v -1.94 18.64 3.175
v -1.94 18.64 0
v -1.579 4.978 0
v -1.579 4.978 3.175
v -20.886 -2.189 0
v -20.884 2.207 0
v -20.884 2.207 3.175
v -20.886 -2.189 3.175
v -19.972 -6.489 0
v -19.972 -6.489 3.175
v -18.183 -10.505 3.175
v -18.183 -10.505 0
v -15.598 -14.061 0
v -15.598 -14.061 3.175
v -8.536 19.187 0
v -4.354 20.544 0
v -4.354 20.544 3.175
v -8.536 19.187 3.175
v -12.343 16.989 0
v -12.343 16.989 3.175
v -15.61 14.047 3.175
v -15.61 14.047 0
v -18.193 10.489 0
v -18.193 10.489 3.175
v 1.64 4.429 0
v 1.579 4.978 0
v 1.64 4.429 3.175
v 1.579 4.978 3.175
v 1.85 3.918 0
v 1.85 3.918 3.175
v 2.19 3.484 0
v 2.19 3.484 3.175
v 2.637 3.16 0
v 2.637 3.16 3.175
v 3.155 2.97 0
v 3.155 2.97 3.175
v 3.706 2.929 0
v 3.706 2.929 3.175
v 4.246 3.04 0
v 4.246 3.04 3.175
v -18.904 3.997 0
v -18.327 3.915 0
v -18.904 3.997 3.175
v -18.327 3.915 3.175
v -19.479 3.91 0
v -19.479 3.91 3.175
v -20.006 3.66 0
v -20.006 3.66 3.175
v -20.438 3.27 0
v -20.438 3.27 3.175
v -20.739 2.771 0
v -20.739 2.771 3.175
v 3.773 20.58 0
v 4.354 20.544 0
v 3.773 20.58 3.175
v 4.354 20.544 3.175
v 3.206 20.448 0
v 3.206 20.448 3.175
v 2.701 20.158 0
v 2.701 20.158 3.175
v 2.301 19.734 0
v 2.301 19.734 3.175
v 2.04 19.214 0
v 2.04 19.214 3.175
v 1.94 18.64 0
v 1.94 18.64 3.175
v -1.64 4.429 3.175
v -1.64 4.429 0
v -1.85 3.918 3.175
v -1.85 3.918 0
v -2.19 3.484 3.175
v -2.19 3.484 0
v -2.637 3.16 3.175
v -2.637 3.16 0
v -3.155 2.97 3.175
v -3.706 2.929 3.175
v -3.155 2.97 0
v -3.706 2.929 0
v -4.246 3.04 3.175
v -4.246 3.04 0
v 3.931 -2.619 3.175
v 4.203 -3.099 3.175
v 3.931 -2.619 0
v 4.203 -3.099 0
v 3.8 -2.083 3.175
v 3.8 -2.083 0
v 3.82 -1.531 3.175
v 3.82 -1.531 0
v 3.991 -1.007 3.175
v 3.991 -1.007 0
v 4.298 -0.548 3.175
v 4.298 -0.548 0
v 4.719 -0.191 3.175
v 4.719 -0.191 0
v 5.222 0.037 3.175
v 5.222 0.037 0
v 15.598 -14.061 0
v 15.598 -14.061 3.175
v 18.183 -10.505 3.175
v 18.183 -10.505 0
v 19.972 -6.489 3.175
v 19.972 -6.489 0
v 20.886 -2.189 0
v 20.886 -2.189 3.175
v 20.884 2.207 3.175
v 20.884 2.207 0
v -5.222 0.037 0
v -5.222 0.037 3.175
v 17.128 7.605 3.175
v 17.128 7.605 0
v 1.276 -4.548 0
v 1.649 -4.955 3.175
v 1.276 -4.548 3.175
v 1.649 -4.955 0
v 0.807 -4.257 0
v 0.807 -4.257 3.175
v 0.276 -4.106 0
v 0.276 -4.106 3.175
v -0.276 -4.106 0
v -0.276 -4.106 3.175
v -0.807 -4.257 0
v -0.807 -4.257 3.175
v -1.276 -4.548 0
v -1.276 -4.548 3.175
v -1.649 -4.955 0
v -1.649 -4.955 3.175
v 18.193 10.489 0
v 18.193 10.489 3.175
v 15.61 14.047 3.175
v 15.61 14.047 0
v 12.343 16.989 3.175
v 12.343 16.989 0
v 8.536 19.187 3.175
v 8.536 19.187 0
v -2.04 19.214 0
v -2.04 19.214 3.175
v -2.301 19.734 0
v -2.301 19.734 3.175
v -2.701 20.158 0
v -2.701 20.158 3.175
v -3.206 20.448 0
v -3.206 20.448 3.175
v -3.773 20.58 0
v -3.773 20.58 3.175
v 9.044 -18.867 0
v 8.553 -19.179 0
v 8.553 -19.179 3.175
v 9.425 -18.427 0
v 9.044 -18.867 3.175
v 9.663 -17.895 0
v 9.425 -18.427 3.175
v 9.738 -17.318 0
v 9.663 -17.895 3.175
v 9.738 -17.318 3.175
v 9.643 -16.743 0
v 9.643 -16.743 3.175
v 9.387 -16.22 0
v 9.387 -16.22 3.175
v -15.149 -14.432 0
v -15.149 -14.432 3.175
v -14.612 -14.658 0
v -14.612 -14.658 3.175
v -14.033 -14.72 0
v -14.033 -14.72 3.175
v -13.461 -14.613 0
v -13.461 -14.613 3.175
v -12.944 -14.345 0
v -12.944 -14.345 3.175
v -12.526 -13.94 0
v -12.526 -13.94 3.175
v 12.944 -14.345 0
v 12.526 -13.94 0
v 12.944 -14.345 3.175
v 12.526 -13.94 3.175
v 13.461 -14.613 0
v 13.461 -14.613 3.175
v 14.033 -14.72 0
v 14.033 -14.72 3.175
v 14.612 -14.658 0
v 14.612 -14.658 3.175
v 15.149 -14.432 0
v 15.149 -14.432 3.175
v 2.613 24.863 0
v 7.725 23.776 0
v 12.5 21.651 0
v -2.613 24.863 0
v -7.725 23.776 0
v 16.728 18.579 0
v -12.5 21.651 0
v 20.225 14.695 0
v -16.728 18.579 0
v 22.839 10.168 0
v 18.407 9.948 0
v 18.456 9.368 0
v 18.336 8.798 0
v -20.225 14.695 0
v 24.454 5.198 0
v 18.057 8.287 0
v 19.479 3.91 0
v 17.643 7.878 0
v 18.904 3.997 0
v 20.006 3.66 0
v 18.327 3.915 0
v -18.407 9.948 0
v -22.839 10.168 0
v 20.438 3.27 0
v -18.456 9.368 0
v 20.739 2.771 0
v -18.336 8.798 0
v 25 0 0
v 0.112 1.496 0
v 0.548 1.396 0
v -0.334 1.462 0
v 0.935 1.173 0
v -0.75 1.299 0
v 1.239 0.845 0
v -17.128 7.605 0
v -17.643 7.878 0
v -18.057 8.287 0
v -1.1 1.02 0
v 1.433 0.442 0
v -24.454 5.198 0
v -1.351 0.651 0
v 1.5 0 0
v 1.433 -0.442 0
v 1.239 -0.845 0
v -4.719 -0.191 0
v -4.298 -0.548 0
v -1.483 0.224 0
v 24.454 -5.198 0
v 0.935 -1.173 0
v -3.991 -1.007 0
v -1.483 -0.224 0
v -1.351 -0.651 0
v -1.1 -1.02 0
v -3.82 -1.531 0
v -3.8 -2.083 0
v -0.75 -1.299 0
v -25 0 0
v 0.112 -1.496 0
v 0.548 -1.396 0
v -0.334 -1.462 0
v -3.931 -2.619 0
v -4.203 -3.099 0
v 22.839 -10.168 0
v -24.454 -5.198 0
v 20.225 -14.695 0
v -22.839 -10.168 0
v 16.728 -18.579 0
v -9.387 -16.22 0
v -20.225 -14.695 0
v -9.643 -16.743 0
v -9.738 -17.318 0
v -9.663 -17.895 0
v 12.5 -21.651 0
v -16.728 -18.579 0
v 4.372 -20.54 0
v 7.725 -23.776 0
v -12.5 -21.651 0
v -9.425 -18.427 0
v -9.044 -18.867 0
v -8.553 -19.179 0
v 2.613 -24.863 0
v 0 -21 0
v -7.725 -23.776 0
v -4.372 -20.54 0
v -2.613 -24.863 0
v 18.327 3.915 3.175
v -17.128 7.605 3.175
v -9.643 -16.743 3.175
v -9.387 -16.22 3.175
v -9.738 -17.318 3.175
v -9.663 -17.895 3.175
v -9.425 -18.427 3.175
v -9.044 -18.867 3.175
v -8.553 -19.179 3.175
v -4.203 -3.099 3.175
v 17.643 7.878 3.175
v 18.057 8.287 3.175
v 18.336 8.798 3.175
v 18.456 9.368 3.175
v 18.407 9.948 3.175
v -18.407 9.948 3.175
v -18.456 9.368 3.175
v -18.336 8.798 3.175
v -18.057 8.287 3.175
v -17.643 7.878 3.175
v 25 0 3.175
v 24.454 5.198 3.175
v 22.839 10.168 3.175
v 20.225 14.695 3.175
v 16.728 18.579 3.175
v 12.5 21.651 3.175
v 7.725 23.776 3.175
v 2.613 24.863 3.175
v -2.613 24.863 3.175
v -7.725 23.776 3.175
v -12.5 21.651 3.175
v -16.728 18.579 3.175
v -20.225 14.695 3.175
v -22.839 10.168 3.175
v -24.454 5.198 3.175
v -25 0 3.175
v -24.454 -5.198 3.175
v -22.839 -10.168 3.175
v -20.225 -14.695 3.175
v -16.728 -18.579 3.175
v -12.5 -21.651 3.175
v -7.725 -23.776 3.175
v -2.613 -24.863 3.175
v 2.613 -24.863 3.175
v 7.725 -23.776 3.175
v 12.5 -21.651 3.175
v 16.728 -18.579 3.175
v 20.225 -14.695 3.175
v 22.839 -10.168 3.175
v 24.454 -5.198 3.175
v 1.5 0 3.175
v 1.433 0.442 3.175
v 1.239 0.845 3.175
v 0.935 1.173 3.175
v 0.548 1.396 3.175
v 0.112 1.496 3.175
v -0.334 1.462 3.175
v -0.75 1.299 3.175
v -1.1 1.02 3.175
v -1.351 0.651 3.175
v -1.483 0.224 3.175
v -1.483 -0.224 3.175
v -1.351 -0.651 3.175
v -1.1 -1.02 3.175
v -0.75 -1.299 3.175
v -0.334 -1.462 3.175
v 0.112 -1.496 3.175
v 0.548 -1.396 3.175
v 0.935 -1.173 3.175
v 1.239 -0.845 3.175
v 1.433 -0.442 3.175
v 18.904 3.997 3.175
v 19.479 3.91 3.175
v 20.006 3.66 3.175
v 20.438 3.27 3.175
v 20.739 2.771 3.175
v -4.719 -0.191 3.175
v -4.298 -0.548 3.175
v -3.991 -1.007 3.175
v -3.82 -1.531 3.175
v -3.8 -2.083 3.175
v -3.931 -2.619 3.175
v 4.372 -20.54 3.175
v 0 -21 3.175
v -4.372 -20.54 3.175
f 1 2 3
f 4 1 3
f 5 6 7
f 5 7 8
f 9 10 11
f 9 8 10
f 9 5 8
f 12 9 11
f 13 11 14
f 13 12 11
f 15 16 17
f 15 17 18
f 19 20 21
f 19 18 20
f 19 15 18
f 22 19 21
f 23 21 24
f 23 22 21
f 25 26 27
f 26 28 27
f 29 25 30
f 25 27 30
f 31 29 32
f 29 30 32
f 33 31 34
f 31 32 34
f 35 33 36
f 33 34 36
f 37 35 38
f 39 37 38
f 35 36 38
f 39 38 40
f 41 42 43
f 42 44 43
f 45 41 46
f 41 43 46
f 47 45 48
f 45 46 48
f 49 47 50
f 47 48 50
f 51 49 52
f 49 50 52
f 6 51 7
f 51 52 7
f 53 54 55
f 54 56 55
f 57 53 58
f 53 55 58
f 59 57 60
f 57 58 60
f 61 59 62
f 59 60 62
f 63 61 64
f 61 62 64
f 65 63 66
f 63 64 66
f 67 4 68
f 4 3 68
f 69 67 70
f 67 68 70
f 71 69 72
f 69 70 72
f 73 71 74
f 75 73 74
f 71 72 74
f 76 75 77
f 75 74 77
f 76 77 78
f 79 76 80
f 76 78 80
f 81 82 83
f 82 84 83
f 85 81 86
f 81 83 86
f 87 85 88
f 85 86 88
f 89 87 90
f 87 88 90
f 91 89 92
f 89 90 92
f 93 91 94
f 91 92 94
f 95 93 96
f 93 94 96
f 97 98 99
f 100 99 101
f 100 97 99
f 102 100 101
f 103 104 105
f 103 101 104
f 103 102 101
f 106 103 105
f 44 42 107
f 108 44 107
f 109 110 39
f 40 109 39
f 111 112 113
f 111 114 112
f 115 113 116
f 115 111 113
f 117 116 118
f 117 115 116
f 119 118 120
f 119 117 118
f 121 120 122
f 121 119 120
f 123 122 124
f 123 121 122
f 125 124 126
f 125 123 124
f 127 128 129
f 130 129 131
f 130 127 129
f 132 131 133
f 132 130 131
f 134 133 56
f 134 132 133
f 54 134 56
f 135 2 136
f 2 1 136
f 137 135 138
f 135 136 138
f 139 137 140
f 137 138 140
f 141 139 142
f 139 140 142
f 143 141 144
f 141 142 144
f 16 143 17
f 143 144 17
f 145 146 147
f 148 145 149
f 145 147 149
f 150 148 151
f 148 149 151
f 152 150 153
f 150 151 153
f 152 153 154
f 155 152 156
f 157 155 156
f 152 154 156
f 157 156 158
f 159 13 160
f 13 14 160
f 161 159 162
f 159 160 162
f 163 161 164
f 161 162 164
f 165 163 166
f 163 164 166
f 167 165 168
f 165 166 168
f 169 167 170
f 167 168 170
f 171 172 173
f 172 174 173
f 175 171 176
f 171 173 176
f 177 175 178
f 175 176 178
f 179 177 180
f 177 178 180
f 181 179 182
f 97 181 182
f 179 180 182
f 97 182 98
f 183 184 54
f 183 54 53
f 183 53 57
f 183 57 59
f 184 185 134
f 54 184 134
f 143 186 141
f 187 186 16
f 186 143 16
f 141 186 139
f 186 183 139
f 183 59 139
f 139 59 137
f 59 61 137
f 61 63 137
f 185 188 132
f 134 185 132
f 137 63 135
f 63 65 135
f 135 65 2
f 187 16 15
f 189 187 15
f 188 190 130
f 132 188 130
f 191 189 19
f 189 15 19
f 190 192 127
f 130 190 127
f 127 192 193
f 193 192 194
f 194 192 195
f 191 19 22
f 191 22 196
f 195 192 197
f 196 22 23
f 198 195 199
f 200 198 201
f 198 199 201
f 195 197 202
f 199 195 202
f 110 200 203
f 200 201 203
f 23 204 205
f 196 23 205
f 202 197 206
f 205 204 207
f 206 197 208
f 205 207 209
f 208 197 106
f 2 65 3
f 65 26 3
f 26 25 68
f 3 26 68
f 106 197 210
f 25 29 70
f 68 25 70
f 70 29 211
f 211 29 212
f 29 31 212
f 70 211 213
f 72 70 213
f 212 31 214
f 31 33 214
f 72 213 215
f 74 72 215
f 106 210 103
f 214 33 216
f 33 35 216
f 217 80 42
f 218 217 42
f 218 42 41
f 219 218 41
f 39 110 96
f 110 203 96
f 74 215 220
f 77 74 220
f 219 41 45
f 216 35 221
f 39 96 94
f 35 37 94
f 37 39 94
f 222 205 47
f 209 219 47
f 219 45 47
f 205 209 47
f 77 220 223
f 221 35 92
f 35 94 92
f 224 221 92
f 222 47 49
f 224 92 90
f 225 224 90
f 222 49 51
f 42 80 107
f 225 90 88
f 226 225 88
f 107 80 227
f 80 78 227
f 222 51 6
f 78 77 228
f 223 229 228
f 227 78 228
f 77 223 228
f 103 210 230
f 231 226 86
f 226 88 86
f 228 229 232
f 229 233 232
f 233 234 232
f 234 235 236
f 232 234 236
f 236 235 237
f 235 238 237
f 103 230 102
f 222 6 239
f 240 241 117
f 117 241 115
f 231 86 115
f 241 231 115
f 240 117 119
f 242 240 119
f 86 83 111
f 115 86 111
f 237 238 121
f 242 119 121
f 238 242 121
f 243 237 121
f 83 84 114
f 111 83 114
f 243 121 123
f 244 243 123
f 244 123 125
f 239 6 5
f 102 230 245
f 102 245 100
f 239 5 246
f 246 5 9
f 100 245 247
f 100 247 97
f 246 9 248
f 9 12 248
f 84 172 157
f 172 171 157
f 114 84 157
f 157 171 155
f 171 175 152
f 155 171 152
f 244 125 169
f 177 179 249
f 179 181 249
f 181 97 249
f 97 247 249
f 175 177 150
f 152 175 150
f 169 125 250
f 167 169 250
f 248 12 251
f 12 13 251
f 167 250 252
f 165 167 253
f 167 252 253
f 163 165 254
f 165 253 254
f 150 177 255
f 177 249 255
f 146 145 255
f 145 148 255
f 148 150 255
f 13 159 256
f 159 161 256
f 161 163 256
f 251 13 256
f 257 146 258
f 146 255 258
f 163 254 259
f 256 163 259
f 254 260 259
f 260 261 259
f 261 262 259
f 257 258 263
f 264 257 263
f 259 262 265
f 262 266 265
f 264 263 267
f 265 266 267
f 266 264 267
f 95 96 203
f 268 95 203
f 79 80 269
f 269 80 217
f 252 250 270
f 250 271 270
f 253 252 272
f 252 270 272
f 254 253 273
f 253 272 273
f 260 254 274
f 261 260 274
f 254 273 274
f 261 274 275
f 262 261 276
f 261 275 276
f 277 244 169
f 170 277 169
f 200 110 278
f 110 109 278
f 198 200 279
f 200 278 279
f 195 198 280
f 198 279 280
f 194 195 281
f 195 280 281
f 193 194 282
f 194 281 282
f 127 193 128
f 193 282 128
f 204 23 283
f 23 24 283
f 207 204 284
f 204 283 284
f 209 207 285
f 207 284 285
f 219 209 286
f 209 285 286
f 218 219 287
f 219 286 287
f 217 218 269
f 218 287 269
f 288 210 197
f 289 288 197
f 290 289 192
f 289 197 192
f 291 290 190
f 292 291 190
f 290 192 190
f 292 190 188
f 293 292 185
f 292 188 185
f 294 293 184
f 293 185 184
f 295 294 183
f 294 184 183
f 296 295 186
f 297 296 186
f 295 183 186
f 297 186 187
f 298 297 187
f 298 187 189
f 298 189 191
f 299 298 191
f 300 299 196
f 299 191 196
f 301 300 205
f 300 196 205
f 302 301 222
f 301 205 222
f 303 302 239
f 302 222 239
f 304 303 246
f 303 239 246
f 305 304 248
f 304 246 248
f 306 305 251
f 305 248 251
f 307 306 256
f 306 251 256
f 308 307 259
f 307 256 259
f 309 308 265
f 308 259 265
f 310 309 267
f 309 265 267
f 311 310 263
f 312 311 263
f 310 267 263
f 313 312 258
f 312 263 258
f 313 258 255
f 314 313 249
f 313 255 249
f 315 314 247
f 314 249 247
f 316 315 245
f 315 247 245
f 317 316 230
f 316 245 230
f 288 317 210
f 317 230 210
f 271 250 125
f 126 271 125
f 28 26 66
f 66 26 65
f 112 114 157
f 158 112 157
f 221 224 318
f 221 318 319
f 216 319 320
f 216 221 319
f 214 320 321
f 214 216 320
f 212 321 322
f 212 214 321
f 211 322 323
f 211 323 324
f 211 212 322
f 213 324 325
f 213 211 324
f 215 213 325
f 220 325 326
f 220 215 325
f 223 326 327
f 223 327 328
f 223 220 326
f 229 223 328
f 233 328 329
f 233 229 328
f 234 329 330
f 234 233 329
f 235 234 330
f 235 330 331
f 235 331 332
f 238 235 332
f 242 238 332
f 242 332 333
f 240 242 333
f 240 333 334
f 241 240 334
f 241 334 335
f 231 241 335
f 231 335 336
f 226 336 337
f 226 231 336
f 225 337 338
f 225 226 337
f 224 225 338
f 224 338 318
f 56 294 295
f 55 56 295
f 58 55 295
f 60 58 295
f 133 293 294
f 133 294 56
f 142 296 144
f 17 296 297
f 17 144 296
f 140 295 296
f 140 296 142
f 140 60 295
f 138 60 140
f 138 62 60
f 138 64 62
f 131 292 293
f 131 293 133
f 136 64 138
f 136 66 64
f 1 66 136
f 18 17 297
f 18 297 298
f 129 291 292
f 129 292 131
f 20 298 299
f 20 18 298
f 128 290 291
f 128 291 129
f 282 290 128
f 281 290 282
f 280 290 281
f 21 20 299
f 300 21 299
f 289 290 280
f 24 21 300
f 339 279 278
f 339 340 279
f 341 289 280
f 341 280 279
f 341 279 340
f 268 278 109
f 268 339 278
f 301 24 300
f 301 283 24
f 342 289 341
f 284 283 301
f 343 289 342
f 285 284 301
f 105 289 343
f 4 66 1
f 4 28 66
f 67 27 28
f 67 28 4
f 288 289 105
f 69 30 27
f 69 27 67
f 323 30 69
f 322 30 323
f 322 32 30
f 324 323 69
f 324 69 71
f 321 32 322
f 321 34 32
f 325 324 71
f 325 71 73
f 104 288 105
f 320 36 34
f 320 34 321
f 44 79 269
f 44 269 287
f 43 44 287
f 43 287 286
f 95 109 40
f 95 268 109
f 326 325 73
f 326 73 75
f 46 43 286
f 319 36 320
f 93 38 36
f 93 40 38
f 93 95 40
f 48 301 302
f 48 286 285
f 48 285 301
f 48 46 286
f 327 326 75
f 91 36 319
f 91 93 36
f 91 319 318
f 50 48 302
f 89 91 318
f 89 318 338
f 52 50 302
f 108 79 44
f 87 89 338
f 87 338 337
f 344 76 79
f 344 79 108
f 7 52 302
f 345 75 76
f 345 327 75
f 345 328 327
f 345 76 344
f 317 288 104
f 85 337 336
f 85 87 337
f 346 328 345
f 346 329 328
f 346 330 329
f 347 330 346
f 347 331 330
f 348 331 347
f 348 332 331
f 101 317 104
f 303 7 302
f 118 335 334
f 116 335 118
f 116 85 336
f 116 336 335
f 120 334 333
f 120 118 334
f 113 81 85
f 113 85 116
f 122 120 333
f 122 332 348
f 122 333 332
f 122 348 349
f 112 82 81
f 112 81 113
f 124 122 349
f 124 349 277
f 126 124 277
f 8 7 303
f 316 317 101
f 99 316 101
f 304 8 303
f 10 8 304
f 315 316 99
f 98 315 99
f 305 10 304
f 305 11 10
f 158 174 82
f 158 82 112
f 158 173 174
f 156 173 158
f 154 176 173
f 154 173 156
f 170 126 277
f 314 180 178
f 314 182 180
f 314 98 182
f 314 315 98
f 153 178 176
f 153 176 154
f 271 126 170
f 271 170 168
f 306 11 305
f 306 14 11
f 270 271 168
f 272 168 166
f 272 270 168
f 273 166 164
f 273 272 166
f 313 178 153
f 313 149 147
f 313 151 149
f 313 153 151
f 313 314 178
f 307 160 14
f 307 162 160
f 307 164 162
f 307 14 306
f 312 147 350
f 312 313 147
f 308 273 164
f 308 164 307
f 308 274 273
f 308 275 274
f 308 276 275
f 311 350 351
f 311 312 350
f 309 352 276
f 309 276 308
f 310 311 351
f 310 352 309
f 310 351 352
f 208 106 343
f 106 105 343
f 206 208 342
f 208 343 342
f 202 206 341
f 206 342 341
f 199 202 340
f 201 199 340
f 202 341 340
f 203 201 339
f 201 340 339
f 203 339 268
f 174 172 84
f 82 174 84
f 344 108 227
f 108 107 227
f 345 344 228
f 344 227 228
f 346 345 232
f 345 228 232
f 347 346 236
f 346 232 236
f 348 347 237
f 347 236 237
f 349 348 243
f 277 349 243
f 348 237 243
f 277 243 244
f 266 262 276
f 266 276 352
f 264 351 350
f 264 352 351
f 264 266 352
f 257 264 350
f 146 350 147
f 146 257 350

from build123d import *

# Parameters (mm, degrees)
SKETCH1_R             = 25
SKETCH1_R_2           = 21
BOSS_EXTRUDE1_DEPTH   = 3.175
SKETCH1_R_3           = 2.5
SKETCH1_R_4           = 1.5
BOSS_EXTRUDE1_2_DEPTH = 3.175
BOSS_EXTRUDE2_DEPTH   = 3.175
CIRPATTERN1_COUNT     = 5
FILLET1_R             = 2
FILLET2_R             = 2


with BuildPart() as part:
    # Sketch1 → Boss-Extrude1 (new body)
    with BuildSketch(Plane.XY):
        Circle(SKETCH1_R)
        Circle(SKETCH1_R_2, mode=Mode.SUBTRACT)
    extrude(amount=BOSS_EXTRUDE1_DEPTH)



with BuildPart() as body_2:
    # Sketch1 → Boss-Extrude1 2 (new body)
    with BuildSketch(Plane.XY):
        Circle(SKETCH1_R_3)
        Circle(SKETCH1_R_4, mode=Mode.SUBTRACT)
    extrude(amount=BOSS_EXTRUDE1_2_DEPTH)


with BuildPart() as part_1:
    add(part.part)

    add(body_2.part)  # Boss-Extrude2 merges body 2
    # Sketch2 → Boss-Extrude2 (add)
    with BuildSketch(Plane.XY):
        with BuildLine():
            ThreePointArc((-1.5, 2), (-0.790569415, 2.371708245), (0, 2.5))
            Line((0, 2.5), (0, 21))
            ThreePointArc((0, 21), (-1.00113831, 20.976122666), (-2, 20.90454496))
            Line((-2, 20.90454496), (-1.5, 2))
        make_face()
        with BuildLine():
            Line((0, 21), (0, 2.5))
            ThreePointArc((0, 2.5), (0.790569415, 2.371708245), (1.5, 2))
            Line((1.5, 2), (2, 20.90454496))
            ThreePointArc((2, 20.90454496), (1.00113831, 20.976122666), (0, 21))
        make_face()
    boss_extrude2 = extrude(amount=BOSS_EXTRUDE2_DEPTH)

    # CirPattern1: Boss-Extrude2 ×5 about axis
    cirpattern1_axis = Axis((0, 0, 0), (0, 0, 1))
    for i in range(1, CIRPATTERN1_COUNT):
        add(boss_extrude2.rotate(cirpattern1_axis, i * 360 / CIRPATTERN1_COUNT))

    # Fillet1
    fillet1_edges = [part_1.edges().sort_by_distance(p)[0] for p in [
        (1.501772388, 2.067012363, 1.5875),
        (-1.501772388, 2.067012363, 1.5875),
        (-2.429918767, -0.789528467, 1.5875),
        (0, -2.554967791, 1.5875),
        (2.429918767, -0.789528467, 1.5875),
    ]]
    fillet(fillet1_edges, radius=FILLET1_R)

    # Fillet2
    fillet2_edges = [part_1.edges().sort_by_distance(p)[0] for p in [
        (-2, 20.90454496, 1.5875),
        (2, 20.90454496, 1.5875),
        (19.263369716, 8.361972685, 1.5875),
        (-20.499437693, 4.55774662, 1.5875),
        (-19.263369716, 8.361972685, 1.5875),
        (-10.669349245, -18.087702637, 1.5875),
        (-13.905417222, -15.736561628, 1.5875),
        (13.905417222, -15.736561628, 1.5875),
        (10.669349245, -18.087702637, 1.5875),
        (20.499437693, 4.55774662, 1.5875),
    ]]
    fillet(fillet2_edges, radius=FILLET2_R)


solid = part_1.part
